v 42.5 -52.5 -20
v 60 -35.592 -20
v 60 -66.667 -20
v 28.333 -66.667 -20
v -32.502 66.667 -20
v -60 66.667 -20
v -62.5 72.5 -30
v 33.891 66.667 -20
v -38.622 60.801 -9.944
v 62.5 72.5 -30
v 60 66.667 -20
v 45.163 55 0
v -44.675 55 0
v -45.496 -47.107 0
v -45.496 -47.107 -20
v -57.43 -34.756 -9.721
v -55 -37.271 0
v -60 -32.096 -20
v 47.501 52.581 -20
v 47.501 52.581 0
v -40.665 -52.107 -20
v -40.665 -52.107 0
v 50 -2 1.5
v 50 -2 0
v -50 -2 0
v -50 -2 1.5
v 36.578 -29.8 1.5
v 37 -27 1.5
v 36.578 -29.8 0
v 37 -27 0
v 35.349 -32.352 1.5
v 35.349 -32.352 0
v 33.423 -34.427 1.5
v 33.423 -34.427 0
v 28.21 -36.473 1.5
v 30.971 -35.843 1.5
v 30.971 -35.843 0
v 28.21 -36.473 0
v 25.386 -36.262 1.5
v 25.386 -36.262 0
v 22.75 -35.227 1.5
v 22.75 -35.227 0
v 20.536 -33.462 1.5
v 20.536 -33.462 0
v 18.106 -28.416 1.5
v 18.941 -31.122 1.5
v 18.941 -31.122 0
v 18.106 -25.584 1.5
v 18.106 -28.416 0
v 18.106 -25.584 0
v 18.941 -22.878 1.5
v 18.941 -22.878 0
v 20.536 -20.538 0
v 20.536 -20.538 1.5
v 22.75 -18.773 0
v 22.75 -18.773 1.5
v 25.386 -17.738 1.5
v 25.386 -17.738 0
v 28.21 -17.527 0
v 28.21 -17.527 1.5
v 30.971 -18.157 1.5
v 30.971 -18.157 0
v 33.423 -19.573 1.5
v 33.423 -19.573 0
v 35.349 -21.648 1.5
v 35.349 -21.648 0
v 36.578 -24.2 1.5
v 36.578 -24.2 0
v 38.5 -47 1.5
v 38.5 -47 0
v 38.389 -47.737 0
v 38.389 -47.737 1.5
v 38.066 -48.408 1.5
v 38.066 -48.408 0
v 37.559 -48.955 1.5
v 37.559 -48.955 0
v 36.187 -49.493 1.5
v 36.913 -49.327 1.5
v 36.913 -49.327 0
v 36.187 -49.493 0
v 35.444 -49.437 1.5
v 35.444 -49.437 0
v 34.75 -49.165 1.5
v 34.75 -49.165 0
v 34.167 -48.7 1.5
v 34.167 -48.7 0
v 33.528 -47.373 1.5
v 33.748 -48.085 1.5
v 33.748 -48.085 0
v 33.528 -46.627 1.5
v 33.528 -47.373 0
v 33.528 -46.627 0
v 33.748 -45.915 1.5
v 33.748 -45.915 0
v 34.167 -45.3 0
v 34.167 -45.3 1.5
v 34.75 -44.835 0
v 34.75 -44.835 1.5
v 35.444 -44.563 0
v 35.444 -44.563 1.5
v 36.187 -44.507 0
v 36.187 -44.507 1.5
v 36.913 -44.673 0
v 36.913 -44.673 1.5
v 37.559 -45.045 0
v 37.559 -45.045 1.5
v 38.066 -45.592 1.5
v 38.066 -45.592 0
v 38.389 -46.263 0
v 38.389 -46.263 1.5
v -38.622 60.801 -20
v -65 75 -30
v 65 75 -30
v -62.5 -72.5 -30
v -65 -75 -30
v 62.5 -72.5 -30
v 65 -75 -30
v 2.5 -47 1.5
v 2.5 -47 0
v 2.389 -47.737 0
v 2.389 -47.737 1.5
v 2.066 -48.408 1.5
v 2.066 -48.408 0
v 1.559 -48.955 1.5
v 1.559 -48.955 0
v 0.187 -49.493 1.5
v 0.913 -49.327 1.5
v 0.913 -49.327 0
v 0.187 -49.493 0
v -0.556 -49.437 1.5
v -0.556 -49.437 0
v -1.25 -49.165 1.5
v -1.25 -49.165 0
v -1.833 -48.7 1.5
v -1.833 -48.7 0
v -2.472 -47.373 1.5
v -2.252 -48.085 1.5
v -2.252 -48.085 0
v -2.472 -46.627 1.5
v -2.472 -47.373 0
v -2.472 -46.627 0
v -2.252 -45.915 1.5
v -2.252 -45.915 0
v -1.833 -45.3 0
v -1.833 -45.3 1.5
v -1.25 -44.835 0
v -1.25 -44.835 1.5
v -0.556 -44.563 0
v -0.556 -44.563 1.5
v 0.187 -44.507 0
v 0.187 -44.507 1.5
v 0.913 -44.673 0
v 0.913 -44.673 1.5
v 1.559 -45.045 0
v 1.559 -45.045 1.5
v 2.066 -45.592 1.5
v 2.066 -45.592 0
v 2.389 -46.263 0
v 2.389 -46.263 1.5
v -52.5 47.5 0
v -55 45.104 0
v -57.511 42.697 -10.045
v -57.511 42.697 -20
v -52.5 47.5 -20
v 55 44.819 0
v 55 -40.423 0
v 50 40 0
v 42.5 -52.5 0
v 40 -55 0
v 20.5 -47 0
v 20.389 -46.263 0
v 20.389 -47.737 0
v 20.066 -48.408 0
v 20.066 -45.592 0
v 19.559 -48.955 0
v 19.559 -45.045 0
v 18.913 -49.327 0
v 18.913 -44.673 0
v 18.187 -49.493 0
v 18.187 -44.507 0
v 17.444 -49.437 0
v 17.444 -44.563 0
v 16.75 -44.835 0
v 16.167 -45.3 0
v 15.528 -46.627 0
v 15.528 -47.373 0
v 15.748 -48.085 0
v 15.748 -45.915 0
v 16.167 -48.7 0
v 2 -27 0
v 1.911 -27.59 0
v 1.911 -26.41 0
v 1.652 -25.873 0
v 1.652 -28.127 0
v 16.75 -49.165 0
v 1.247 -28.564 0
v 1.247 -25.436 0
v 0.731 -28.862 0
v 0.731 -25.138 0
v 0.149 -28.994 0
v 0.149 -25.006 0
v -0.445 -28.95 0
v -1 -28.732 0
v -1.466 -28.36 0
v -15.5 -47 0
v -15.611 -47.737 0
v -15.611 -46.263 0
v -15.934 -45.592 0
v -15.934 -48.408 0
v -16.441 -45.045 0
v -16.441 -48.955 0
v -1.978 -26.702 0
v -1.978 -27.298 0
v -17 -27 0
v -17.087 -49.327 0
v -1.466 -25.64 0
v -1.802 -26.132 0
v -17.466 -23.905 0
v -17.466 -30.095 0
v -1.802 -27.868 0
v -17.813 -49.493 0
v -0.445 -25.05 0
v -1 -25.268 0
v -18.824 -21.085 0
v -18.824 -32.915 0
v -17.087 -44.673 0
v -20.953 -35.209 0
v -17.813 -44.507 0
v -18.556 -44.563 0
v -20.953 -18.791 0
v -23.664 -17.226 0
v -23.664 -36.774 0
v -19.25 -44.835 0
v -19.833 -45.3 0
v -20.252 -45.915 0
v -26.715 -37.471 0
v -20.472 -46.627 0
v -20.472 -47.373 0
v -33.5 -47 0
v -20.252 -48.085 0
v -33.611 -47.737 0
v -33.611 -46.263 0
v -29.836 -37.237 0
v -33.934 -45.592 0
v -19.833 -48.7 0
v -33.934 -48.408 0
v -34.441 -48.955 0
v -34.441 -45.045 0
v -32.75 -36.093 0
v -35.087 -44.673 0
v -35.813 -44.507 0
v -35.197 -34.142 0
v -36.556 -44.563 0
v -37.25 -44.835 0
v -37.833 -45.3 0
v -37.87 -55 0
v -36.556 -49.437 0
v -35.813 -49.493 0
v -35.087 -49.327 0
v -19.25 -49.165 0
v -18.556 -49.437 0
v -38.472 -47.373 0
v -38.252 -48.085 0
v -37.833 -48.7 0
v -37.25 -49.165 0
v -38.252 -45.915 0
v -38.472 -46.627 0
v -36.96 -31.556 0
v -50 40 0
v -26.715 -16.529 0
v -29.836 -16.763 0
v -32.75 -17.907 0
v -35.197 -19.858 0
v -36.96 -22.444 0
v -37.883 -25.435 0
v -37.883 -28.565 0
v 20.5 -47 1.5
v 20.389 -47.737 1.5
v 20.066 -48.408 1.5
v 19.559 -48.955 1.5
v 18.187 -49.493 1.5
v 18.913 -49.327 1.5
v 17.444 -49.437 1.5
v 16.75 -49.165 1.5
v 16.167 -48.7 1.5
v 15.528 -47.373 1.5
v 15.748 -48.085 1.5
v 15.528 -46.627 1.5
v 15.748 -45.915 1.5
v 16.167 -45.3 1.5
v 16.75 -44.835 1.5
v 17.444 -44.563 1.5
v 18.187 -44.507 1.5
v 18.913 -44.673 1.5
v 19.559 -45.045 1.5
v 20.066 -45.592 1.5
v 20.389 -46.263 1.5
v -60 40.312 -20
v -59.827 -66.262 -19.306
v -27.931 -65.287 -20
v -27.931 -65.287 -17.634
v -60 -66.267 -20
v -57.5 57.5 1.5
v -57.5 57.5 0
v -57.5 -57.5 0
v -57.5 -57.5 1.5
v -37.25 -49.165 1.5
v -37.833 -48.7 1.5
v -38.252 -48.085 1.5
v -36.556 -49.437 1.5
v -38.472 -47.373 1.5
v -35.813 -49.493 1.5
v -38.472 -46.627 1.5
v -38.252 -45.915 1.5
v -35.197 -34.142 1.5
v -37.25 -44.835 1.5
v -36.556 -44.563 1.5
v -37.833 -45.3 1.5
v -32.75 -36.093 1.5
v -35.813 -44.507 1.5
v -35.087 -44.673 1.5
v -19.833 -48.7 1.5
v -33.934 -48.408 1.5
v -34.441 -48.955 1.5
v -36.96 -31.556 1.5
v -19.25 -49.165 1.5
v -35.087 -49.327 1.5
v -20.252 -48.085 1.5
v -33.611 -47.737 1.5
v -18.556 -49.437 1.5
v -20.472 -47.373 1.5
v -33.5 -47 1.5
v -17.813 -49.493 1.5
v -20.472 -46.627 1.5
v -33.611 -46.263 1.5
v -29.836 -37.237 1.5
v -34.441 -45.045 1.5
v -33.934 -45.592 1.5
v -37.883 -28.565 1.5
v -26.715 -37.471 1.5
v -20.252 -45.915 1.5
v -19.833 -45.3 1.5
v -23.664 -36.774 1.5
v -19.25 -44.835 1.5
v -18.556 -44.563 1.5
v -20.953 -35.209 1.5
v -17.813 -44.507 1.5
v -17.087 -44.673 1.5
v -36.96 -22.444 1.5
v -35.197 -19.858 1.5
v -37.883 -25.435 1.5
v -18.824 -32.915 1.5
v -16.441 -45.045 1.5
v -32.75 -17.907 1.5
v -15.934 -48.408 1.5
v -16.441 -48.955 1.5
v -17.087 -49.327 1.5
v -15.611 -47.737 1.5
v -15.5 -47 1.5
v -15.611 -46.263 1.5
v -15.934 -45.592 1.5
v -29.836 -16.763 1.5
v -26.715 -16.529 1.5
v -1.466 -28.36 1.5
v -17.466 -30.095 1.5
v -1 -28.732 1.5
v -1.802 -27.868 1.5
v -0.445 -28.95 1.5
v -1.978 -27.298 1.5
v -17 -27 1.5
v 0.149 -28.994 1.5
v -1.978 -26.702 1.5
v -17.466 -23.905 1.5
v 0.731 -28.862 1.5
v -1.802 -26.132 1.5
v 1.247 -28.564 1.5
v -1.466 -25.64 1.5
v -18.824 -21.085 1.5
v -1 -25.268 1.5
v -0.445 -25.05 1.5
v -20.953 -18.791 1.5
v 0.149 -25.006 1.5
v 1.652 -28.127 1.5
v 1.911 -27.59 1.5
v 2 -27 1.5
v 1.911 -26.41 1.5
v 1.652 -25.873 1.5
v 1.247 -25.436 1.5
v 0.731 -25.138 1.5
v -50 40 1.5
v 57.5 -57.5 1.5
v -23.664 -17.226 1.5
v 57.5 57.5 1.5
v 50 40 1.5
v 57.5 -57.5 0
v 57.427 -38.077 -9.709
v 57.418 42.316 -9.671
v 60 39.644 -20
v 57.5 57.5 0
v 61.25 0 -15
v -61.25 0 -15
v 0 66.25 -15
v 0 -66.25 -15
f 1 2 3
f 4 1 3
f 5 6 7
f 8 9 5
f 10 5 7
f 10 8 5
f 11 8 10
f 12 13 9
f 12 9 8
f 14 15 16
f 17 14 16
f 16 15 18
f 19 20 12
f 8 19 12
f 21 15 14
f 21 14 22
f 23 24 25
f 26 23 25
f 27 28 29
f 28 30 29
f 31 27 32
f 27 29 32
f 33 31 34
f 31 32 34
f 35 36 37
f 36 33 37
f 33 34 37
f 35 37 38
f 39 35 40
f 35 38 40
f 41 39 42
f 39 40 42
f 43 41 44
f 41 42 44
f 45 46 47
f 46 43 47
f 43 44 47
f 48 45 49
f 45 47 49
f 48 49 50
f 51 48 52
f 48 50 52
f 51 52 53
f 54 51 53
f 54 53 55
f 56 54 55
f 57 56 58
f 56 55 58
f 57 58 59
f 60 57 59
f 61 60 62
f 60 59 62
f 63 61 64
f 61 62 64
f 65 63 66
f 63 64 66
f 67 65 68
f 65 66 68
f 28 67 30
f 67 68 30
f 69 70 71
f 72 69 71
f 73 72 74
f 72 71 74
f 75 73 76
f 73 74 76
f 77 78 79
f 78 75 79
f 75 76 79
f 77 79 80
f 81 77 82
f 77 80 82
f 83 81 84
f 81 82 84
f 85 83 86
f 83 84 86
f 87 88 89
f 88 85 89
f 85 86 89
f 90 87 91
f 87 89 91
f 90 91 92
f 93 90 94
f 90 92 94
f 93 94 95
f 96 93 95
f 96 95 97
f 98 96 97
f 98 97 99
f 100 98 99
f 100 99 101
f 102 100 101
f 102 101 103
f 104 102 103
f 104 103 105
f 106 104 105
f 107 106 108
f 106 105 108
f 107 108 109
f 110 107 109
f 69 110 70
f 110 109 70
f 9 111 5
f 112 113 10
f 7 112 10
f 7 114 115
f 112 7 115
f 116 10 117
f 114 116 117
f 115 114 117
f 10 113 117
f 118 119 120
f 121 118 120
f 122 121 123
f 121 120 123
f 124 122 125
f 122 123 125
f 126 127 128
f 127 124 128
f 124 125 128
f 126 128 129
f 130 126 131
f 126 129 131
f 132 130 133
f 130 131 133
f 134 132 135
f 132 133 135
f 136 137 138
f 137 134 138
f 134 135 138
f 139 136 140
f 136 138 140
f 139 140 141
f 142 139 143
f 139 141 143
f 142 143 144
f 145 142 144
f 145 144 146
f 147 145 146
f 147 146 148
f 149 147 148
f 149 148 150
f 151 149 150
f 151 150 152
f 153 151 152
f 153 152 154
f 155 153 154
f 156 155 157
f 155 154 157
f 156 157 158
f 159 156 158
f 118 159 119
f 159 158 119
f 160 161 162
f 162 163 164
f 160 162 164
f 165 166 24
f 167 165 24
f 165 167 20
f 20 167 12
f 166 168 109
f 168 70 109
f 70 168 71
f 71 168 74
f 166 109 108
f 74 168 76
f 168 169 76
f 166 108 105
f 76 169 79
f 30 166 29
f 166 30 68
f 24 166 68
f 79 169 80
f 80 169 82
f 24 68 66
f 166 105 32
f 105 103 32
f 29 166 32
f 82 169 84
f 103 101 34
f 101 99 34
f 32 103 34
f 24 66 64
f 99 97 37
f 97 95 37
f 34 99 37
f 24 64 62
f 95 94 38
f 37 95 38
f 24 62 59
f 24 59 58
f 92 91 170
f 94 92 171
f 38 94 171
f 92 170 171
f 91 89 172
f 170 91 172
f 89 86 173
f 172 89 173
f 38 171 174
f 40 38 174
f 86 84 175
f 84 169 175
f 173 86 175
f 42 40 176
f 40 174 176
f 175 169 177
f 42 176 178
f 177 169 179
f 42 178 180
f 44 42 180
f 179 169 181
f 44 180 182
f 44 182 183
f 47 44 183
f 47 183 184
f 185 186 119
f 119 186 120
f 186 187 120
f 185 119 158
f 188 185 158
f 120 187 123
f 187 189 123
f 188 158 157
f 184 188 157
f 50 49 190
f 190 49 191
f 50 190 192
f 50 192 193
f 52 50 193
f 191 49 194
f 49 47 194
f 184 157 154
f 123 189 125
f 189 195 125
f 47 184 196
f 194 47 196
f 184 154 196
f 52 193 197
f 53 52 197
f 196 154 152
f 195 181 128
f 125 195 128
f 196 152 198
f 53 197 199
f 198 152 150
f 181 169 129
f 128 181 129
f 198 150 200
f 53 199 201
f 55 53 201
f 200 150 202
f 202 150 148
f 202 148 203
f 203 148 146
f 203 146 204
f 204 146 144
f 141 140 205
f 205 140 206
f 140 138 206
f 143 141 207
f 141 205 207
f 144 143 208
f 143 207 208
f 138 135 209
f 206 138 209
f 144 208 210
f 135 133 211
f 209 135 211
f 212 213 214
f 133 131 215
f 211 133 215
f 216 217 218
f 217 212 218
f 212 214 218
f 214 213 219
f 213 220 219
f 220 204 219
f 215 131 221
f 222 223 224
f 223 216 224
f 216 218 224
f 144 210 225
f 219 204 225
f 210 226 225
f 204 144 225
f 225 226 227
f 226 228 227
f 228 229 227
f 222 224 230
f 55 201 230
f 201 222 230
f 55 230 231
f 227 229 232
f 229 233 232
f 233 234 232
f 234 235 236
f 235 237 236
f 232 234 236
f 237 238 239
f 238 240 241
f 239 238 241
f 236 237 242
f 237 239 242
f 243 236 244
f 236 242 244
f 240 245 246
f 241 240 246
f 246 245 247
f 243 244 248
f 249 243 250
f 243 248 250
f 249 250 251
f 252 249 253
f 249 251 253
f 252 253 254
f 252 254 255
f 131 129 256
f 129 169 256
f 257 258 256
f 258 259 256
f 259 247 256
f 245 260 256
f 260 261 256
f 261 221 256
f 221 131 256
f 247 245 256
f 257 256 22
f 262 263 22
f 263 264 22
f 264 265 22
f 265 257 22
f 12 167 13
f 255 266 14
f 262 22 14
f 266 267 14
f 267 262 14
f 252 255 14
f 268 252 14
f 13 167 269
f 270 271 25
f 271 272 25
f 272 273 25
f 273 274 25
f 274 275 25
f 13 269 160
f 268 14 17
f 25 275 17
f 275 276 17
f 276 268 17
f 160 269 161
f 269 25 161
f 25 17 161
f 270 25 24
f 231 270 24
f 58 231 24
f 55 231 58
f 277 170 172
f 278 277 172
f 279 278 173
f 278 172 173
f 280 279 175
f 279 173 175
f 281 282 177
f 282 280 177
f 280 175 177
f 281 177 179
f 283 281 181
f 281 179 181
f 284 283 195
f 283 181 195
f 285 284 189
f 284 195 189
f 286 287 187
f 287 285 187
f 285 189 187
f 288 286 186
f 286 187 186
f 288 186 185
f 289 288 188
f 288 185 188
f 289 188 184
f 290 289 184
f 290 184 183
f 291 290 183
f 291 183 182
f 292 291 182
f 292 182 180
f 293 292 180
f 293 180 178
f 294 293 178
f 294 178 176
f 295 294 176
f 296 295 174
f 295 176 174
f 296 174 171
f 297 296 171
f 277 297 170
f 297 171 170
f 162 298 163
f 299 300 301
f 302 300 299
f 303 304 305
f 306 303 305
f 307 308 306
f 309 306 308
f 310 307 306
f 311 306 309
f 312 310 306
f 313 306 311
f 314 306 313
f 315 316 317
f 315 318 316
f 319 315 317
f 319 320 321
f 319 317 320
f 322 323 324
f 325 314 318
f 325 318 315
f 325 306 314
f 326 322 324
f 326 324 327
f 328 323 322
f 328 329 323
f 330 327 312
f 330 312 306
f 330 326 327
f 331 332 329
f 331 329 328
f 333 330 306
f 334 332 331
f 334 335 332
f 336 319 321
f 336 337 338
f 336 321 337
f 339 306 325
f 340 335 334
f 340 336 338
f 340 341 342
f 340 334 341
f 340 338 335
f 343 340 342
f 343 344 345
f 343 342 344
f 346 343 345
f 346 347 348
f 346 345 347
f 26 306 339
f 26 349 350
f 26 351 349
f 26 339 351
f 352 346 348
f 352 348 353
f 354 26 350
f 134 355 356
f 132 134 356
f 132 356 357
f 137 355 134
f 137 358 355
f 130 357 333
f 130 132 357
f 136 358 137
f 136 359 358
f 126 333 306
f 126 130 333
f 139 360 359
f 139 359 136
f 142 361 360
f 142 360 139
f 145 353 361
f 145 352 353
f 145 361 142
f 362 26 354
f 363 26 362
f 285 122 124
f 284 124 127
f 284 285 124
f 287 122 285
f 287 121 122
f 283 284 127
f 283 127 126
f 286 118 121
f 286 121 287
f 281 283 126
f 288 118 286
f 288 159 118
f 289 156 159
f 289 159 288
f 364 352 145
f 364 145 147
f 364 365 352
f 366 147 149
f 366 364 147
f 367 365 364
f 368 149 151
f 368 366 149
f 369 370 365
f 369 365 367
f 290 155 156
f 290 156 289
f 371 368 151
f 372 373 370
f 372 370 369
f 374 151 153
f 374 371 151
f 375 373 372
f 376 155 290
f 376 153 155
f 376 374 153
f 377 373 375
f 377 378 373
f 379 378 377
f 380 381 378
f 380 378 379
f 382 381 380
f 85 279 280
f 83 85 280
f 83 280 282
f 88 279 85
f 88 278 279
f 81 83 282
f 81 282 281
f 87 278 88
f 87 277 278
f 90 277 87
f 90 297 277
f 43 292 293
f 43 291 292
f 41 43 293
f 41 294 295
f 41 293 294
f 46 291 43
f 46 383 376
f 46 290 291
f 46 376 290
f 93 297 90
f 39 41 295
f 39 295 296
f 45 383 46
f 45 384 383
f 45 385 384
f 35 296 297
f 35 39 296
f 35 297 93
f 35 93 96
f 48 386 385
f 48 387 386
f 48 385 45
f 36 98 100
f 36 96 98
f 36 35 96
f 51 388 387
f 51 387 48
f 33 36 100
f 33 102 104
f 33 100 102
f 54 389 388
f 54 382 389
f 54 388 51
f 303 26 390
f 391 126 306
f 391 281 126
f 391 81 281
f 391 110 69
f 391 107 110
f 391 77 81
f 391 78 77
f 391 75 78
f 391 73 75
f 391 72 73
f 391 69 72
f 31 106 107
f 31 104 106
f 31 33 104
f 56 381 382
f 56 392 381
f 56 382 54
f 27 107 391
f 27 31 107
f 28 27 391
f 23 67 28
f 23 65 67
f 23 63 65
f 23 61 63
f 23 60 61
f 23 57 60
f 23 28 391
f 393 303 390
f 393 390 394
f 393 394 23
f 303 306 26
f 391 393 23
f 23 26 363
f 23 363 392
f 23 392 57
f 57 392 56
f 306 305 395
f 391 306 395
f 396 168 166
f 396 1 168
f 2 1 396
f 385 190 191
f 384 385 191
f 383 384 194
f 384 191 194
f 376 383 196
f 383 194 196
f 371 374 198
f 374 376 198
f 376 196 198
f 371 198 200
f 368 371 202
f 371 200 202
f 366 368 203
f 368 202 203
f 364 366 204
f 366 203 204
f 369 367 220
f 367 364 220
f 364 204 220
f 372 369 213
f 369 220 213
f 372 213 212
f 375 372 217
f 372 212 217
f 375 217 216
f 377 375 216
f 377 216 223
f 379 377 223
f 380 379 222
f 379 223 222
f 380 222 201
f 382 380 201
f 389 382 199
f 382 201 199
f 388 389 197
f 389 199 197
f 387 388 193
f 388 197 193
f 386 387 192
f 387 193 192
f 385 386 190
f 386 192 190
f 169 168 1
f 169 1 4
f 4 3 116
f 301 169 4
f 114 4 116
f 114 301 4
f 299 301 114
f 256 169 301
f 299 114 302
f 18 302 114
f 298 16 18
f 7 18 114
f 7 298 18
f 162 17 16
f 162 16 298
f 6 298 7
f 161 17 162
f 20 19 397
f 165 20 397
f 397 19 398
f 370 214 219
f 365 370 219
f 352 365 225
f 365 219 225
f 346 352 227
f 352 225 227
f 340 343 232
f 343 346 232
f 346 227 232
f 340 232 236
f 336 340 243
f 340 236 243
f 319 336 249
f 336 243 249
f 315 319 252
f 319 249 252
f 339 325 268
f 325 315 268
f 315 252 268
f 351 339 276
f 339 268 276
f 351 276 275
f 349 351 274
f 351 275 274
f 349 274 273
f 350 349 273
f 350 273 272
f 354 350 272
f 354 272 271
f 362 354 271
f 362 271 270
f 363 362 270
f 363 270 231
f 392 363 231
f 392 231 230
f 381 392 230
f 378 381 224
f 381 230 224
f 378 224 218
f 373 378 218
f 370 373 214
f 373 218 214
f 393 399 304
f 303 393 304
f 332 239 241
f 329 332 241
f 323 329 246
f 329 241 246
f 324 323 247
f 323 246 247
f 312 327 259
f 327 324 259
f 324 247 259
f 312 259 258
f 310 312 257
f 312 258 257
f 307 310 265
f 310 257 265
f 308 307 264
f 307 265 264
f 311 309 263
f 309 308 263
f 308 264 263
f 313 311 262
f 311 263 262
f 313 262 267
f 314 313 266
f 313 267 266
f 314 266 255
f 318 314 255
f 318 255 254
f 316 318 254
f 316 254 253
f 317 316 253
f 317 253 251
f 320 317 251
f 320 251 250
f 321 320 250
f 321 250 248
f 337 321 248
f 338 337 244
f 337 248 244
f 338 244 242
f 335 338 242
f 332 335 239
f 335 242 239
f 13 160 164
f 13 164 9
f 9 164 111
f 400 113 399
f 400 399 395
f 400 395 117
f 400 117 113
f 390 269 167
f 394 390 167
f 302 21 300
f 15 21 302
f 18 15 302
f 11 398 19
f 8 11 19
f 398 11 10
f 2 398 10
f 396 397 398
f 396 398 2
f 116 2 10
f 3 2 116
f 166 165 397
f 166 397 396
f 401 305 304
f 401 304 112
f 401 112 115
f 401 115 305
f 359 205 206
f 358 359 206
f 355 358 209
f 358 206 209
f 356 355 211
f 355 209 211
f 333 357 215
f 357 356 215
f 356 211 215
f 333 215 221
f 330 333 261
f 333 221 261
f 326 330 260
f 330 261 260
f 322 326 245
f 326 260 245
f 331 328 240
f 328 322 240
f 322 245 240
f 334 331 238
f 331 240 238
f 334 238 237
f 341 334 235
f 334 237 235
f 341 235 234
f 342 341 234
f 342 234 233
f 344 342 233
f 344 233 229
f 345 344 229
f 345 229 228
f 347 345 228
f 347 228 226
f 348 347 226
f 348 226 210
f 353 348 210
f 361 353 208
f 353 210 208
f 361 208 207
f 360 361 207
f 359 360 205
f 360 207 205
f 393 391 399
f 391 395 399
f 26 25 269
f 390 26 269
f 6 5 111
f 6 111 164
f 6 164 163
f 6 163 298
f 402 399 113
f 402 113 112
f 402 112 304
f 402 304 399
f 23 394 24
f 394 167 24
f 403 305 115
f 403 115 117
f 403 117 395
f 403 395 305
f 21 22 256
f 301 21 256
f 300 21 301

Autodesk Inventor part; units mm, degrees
sketch "Szkic1" plane through (0, 0, 0) normal (0, 0, 1) x (1, 0, 0)
  line L0 (-55, -55) -> (55, -55)
  line L1 (55, -55) -> (55, 55)
  line L2 (55, 55) -> (-55, 55)
  line L3 (-55, 55) -> (-55, -55)
  line L4 (-55, -55) -> (55, 55) construction
  line L5 (-55, 55) -> (-55, 40) construction
  line L6 (-55, 40) -> (-50, 40)
  line L7 (-50, 40) -> (50, 40)
  line L8 (50, 40) -> (50, -2)
  line L9 (50, -2) -> (-50, -2)
  line L10 (-50, -2) -> (-50, 40)
  line L11 (0, -2) -> (0, -27) construction
  circle A0 centre (0, -27) radius 2
  line L12 (0, -27) -> (27.5, -27) construction
  line L13 (27.5, -27) -> (-27.5, -27) construction
  circle A1 centre (-27.5, -27) radius 10.5
  circle A2 centre (27.5, -27) radius 9.5
  line L14 (0, -27) -> (0, -47) construction
  line L15 (0, -47) -> (0, -57) construction
  line L16 (0, -47) -> (-18, -47) construction
  line L17 (-18, -47) -> (-36, -47) construction
  line L18 (0, -47) -> (18, -47) construction
  line L19 (18, -47) -> (36, -47) construction
  circle A3 centre (-36, -47) radius 2.5
  circle A4 centre (-18, -47) radius 2.5
  circle A5 centre (0, -47) radius 2.5
  circle A6 centre (18, -47) radius 2.5
  circle A7 centre (36, -47) radius 2.5
  line L20 (-57.5, -57.5) -> (57.5, -57.5)
  line L21 (57.5, -57.5) -> (57.5, 57.5)
  line L22 (57.5, 57.5) -> (-57.5, 57.5)
  line L23 (-57.5, 57.5) -> (-57.5, -57.5)
  line L24 (-57.5, -57.5) -> (57.5, 57.5) construction
  line L25 (57.5, -57.5) -> (-57.5, 57.5) construction
  point P0 (0, 0)
  point P1 (-55, -37)
  point P2 (55, -37)
  dimension "d0" = 110
  dimension "d1" = 110
  dimension "d2" = 15
  dimension "d3" = 100
  dimension "d4" = 42
  dimension "d5" = 25
  dimension "d6" = 4
  dimension "d7" = 27.5
  dimension "d8" = 55
  dimension "d10" = 19
  dimension "d11" = 20
  dimension "d12" = 10
  dimension "d13" = 18
  dimension "d14" = 18
  dimension "d15" = 18
  dimension "d16" = 18
  dimension "d17" = 5
  dimension "d18" = 5
  dimension "d19" = 5
  dimension "d20" = 5
  dimension "d21" = 5
  dimension "d51" = 115
  dimension "d52" = 115
extrude "Wyciągnięcie proste1" add sketch "Szkic1" along normal blind 1.5 contours L3 L2 L1 L0 | L23 L22 L21 L20
ref_plane "Płaszczyzna konstrukcyjna1" through (0, 0, -30) normal (0, 0, -1) x (-1, 0, 0)
ref_plane "Płaszczyzna konstrukcyjna2" through (0, 0, -20) normal (0, 0, -1) x (-1, 0, 0)
ref_plane "Płaszczyzna konstrukcyjna3" through (0, 0, 0) normal (0, 0, -1) x (-1, 0, 0)
ref_plane "Płaszczyzna konstrukcyjna4" through (75, -75, -30) normal (0, 0, -1) x (-1, 0, 0)
chamfer "Faza1" [suppressed]
sketch "Szkic9" plane through (0, 0, 0) normal (0, 0, -1) x (-1, 0, 0)
  line L0 (-57.5, -57.5) -> (57.5, -57.5)
  line L1 (57.5, -57.5) -> (57.5, 57.5)
  line L2 (57.5, 57.5) -> (-57.5, 57.5)
  line L3 (-57.5, 57.5) -> (-57.5, -57.5)
  line L4 (-57.5, -57.5) -> (57.5, 57.5) construction
  line L5 (57.5, -57.5) -> (-57.5, 57.5) construction
  point P0 (0, 0)
sketch "Szkic10" plane through (0, 0, 0) normal (0, 0, -1) x (-1, 0, 0)
  line L0 (-55, -55) -> (55, -55)
  line L1 (55, -55) -> (55, 55)
  line L2 (55, 55) -> (-55, 55)
  line L3 (-55, 55) -> (-55, -55)
  line L4 (-55, -55) -> (55, 55) construction
  line L5 (55, -55) -> (-55, 55) construction
  point P0 (0, 0)
  dimension "d67" = 110
  dimension "d68" = 110
ref_plane "Płaszczyzna konstrukcyjna5" through (45.0845, 55, -30) normal (0, 0, -1) x (-1, 0, 0)
sketch "Szkic14" plane through (45.0845, 55, -30) normal (0, 0, -1) x (-1, 0, 0)
  line L0 (-19.9155, -130) -> (110.0845, -130)
  line L1 (110.0845, -130) -> (110.0845, 20)
  line L2 (110.0845, 20) -> (-19.9155, 20)
  line L3 (-19.9155, 20) -> (-19.9155, -130)
  line L4 (-19.9155, -130) -> (110.0845, 20) construction
  line L5 (110.0845, -130) -> (-19.9155, 20) construction
  point P0 (45.0845, -55)
  dimension "d93" = 130
  dimension "d94" = 150
sketch "Szkic15" plane through (45.0845, 55, -30) normal (0, 0, -1) x (-1, 0, 0)
  line L0 (107.5845, -127.5) -> (-17.4155, -127.5)
  line L1 (-17.4155, -127.5) -> (-17.4155, 17.5)
  line L2 (-17.4155, 17.5) -> (107.5845, 17.5)
  line L3 (107.5845, 17.5) -> (107.5845, -127.5)
  line L4 (107.5845, -127.5) -> (-17.4155, 17.5) construction
  line L5 (-17.4155, -127.5) -> (107.5845, 17.5) construction
  point P0 (45.0845, -55)
  dimension "d95" = 125
  dimension "d96" = 145
loft "Wyciągnięcie złożone5" add profiles "Szkic9", "Szkic14"
loft "Wyciągnięcie złożone6" cut profiles "Szkic15", "Szkic10"
sketch "Szkic8" plane through (0, 0, -20) normal (0, 0, -1) x (-1, 0, 0)
  line L0 (-52.5, -52.5) -> (52.5, 52.5) construction
  line L1 (-55, 55) -> (-62.5, 72.5) projected
  line L2 (52.5, 52.5) -> (52.5, 47.5)
  line L3 (52.5, 47.5) -> (38.6222, 60.8006)
  line L4 (57.5113, 42.6971) -> (52.5, 47.5)
  line L5 (-52.5, 52.5) -> (-47.5006, 52.5806)
  line L6 (-47.5006, 52.5806) -> (-33.6043, 66.9631)
  line L7 (-47.5006, 52.5806) -> (-60.6627, 38.958)
  line L8 (-60.6627, 38.958) -> (-60.1271, 66.9631)
  line L9 (-60.1271, 66.9631) -> (-33.6043, 66.9631)
  line L10 (-52.5, -52.5) -> (-42.5, -52.5)
  line L11 (-42.5, -52.5) -> (-60.3532, -35.2504)
  line L12 (45.4959, -47.1074) -> (40.6649, -52.1074)
  line L13 (45.4959, -47.1074) -> (60.2173, -31.8709)
  line L14 (-60.3532, -35.2504) -> (-60.3532, -67.4907)
  line L15 (-55, -55) -> (-62.5, -72.5) projected
  line L16 (-42.5, -52.5) -> (-34.5509, -60.4491)
  line L17 (-42.5, -52.5) -> (-31.2582, -52.5) construction
  line L18 (-60.3532, -67.4907) -> (-27.5093, -67.4907)
  line L19 (-27.5093, -67.4907) -> (-35.5667, -59.4333)
  line L20 (57.5113, 42.6971) -> (38.6222, 60.8006)
  line L21 (38.6222, 60.8006) -> (32.1923, 66.9631)
  line L22 (32.1923, 66.9631) -> (60.2173, 66.9631)
  line L23 (60.2173, 66.9631) -> (60.4778, 39.854)
  line L24 (60.4778, 39.854) -> (57.5113, 42.6971)
  line L25 (40.6649, -52.1074) -> (27.9311, -65.2867)
  line L26 (27.9311, -65.2867) -> (61.4401, -66.3113)
  line L27 (60.2173, -31.8709) -> (61.4401, -66.3113)
  point P0 (0, 0)
  dimension "d83" = 5
  dimension "d84" = 5
  dimension "d85" = 10
  dimension "d87" = 45
extrude "Wyciągnięcie proste3" add sketch "Szkic8" against normal up to next
properties part number "gora_obodowy_plaska"
